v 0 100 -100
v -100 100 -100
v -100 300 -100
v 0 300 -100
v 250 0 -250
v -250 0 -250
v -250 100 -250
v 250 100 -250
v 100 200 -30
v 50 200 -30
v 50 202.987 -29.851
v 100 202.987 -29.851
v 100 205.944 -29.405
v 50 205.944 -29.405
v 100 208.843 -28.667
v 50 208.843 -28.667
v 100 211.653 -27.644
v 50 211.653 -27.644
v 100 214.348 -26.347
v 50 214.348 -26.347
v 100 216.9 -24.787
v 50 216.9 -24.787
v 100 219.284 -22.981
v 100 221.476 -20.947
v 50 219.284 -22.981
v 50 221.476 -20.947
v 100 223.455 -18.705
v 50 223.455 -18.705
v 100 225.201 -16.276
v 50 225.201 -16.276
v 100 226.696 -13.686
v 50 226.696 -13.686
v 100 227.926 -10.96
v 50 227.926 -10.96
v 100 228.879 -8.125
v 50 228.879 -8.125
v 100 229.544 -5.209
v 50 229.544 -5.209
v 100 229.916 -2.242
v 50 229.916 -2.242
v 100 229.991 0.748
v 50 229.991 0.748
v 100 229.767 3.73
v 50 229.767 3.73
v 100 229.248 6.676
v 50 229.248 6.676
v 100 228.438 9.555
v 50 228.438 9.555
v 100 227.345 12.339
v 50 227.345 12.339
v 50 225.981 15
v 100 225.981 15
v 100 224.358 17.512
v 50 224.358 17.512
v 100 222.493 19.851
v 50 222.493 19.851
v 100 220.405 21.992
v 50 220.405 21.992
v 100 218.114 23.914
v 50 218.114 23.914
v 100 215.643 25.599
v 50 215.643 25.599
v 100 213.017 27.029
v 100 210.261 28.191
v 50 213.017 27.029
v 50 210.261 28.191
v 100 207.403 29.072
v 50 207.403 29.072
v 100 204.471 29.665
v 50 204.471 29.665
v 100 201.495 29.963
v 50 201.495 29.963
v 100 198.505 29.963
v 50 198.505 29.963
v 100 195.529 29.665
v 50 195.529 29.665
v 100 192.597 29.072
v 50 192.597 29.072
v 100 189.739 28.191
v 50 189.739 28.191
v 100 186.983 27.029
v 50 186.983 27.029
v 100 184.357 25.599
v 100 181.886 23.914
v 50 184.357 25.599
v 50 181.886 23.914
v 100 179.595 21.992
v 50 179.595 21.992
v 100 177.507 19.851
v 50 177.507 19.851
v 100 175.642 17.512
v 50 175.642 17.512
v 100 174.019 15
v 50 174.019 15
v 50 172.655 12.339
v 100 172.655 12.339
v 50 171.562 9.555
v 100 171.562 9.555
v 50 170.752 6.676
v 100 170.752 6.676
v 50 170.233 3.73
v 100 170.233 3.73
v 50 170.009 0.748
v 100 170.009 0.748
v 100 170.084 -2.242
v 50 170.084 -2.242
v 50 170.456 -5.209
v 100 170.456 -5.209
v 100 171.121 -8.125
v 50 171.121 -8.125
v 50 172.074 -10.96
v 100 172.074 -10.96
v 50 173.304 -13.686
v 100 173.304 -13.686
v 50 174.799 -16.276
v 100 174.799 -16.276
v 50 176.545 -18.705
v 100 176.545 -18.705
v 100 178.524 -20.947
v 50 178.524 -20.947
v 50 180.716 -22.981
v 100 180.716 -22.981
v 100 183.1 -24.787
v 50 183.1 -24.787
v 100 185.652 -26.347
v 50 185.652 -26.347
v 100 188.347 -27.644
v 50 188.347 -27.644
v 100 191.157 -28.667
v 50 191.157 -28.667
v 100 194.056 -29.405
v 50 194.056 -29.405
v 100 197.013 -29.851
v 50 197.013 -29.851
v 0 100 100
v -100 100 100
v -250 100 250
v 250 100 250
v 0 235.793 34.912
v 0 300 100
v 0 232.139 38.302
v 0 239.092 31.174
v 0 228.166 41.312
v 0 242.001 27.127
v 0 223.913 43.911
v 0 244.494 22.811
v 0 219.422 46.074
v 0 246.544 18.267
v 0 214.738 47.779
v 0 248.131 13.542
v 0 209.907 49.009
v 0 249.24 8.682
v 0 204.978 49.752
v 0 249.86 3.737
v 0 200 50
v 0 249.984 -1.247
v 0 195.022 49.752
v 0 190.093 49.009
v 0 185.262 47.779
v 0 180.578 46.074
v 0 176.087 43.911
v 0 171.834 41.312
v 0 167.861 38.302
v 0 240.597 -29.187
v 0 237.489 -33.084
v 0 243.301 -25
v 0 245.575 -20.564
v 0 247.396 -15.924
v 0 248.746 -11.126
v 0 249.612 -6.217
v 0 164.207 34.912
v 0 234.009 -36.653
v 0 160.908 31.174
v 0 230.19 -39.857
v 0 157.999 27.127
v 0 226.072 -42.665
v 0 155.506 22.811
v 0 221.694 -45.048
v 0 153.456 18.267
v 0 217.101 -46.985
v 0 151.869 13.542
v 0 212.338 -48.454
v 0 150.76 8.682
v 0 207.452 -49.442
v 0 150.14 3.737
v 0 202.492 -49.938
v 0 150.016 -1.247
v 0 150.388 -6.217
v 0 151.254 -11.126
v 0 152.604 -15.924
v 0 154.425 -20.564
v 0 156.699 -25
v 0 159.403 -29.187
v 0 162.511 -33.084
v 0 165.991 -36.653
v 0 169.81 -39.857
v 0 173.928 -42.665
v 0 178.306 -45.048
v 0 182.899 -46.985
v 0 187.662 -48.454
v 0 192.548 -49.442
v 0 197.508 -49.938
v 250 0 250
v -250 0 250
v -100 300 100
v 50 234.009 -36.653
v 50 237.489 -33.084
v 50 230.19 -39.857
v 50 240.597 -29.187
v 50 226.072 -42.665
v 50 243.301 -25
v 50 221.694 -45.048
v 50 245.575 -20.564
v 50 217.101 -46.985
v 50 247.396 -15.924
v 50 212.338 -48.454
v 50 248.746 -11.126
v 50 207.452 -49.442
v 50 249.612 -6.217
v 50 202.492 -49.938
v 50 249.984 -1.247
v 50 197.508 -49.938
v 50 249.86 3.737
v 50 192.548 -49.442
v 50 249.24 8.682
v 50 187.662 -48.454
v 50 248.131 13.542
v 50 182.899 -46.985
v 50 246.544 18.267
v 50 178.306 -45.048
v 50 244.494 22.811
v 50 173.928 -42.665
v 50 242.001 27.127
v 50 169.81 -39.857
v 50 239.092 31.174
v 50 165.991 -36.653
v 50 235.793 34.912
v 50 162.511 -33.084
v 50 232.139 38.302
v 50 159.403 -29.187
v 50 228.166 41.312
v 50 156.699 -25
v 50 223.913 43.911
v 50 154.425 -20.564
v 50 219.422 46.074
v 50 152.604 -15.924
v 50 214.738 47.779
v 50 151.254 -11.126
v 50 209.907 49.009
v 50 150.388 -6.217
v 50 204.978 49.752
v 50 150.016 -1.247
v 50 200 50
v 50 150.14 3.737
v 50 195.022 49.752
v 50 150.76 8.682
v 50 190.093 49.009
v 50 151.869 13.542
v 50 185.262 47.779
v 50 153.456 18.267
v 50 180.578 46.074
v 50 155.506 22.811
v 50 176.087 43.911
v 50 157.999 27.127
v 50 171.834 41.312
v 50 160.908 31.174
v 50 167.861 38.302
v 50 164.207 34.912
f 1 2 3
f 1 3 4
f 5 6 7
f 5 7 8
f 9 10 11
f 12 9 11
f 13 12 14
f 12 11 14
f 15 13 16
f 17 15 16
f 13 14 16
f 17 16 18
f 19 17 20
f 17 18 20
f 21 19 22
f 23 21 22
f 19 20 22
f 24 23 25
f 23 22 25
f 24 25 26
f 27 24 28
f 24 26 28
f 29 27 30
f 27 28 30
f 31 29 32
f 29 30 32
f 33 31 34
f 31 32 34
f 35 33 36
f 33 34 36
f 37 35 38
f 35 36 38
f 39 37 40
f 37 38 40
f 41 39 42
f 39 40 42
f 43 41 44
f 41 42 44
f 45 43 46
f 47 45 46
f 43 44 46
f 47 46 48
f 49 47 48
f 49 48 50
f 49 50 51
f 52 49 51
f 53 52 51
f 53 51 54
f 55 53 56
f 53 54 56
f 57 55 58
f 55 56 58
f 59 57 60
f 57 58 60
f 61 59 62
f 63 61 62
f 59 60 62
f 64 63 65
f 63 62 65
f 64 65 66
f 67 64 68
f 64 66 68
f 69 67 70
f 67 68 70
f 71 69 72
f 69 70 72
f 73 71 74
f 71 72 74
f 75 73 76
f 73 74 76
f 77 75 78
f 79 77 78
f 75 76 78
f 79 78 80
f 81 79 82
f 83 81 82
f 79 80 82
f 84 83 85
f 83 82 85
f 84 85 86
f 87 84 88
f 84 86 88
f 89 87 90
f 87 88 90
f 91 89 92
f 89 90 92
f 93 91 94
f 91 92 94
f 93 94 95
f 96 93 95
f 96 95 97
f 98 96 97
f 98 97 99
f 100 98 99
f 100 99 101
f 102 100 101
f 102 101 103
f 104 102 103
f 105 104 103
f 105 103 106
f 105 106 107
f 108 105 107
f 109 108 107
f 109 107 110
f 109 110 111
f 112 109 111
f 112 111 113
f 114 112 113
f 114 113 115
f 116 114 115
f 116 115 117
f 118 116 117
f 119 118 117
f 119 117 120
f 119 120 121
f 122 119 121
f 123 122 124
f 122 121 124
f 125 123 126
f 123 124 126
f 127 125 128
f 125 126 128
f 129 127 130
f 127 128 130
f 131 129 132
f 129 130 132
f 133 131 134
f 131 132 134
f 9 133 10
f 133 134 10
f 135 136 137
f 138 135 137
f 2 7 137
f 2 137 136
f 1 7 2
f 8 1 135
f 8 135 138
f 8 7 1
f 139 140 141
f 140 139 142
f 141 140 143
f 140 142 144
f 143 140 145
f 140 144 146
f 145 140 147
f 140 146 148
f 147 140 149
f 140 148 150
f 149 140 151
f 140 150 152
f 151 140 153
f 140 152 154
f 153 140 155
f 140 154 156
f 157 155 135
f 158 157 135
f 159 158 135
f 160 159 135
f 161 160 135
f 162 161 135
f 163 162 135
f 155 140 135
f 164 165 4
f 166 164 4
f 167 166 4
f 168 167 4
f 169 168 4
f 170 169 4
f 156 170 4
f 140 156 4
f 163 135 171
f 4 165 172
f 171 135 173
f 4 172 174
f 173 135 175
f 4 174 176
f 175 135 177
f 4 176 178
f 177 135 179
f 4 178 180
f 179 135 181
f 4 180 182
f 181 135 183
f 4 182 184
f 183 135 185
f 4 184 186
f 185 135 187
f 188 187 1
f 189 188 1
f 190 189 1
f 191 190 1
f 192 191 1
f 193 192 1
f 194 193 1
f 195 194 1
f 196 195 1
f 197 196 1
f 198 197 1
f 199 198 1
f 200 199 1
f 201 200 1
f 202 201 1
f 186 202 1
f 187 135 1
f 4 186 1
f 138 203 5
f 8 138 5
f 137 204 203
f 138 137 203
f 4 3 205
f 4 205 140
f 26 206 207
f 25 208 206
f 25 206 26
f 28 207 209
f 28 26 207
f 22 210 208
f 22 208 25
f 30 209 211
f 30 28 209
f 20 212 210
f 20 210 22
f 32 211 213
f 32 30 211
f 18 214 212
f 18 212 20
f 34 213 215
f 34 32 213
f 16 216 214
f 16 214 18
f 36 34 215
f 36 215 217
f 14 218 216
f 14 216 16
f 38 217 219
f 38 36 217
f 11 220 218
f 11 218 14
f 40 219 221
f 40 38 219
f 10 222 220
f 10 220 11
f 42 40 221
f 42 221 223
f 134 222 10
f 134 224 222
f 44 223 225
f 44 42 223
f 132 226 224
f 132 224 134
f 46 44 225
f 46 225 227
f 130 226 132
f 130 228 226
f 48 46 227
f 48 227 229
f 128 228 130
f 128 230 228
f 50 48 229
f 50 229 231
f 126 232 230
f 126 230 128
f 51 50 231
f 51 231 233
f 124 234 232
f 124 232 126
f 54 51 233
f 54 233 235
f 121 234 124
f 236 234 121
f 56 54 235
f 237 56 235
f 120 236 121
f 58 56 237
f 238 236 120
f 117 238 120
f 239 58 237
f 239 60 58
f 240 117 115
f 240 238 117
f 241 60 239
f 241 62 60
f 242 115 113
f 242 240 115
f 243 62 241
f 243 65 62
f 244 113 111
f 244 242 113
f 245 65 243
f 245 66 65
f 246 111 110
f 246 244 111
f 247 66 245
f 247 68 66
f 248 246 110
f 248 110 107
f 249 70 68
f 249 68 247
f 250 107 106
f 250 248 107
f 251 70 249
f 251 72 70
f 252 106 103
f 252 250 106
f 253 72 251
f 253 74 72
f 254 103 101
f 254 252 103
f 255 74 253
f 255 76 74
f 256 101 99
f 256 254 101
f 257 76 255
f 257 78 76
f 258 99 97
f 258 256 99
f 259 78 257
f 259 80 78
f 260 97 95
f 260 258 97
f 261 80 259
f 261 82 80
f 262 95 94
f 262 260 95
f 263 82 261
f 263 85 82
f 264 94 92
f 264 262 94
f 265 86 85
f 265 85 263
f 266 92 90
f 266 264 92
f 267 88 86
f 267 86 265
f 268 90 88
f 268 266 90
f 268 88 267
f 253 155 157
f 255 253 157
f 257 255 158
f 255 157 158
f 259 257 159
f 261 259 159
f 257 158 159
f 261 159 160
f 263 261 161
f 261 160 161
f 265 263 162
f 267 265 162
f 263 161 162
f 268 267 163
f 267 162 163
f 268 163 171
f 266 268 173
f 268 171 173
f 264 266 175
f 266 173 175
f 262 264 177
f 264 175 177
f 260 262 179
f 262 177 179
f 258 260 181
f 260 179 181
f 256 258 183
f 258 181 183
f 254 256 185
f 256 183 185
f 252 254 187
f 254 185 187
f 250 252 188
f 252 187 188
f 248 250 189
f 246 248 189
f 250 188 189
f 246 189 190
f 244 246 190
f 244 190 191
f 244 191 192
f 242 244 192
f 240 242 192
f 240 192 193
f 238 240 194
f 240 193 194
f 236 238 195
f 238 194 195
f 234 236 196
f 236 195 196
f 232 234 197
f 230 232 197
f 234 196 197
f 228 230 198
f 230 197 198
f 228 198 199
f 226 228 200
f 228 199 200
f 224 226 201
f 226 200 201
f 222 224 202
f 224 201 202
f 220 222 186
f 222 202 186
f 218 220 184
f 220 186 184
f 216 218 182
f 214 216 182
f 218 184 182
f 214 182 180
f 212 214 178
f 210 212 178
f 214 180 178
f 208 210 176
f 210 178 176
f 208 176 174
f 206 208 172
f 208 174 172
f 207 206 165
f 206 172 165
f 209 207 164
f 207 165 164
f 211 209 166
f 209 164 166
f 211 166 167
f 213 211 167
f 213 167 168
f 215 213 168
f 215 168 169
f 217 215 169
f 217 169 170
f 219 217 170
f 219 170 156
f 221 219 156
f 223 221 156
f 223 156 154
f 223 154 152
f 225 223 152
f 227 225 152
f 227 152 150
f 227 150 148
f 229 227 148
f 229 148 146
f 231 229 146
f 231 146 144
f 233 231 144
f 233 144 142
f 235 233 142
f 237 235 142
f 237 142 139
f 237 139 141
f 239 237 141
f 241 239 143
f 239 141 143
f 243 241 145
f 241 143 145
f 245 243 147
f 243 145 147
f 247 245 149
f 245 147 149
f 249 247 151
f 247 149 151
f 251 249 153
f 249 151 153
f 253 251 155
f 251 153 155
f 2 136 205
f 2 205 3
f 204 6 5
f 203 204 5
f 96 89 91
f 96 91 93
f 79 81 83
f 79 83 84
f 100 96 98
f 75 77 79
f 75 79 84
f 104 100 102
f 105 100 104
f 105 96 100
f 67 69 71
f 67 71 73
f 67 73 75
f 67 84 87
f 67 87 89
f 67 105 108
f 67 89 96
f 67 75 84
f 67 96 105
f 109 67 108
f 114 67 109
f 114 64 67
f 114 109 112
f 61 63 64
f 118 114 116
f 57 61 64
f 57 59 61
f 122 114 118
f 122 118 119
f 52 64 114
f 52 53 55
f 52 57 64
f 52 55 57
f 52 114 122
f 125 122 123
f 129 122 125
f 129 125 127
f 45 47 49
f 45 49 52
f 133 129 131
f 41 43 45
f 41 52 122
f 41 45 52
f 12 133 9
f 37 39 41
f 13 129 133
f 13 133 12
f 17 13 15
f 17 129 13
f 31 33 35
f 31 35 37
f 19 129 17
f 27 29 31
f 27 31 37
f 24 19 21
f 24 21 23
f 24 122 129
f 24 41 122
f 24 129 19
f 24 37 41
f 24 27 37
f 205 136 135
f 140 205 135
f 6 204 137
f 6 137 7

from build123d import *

# Parameters (mm, degrees)
IZIM1_W                     = 500
IZIM1_H                     = 500
Y_KSEKLIK_EKSTR_ZYON1_DEPTH = 100
IZIM2_W                     = 100
IZIM2_H                     = 200
Y_KSEKLIK_EKSTR_ZYON2_DEPTH = 200
IZIM3_R                     = 50
Y_KSEKLIK_EKSTR_ZYON3_DEPTH = 50
IZIM4_R                     = 30
Y_KSEKLIK_EKSTR_ZYON4_DEPTH = 50


with BuildPart() as part:
    # Çizim1 → Yükseklik-Ekstrüzyon1 (new body)
    with BuildSketch(Plane(origin=(0, 0, 0), x_dir=(1, 0, 0), z_dir=(0, 1, 0))):
        Rectangle(IZIM1_W, IZIM1_H)
    extrude(amount=Y_KSEKLIK_EKSTR_ZYON1_DEPTH)

    # Çizim2 → Yükseklik-Ekstrüzyon2 (add)
    with BuildSketch(Plane(origin=(0, 100, 0), x_dir=(1, 0, 0), z_dir=(0, 1, 0))):
        with Locations((-50, 0)):
            Rectangle(IZIM2_W, IZIM2_H)
    extrude(amount=Y_KSEKLIK_EKSTR_ZYON2_DEPTH)

    # Çizim3 → Yükseklik-Ekstrüzyon3 (add)
    with BuildSketch(Plane(origin=(0, 0, 0), x_dir=(0, 0, -1), z_dir=(1, 0, 0))):
        with Locations(Location((0, 200, 0), (0, 0, 180))):
            Circle(IZIM3_R)
    extrude(amount=Y_KSEKLIK_EKSTR_ZYON3_DEPTH)

    # Çizim4 → Yükseklik-Ekstrüzyon4 (add)
    with BuildSketch(Plane(origin=(50, 0, 0), x_dir=(0, 0, -1), z_dir=(1, 0, 0))):
        with Locations((0, 200)):
            Circle(IZIM4_R)
    extrude(amount=Y_KSEKLIK_EKSTR_ZYON4_DEPTH)


solid = part.part
